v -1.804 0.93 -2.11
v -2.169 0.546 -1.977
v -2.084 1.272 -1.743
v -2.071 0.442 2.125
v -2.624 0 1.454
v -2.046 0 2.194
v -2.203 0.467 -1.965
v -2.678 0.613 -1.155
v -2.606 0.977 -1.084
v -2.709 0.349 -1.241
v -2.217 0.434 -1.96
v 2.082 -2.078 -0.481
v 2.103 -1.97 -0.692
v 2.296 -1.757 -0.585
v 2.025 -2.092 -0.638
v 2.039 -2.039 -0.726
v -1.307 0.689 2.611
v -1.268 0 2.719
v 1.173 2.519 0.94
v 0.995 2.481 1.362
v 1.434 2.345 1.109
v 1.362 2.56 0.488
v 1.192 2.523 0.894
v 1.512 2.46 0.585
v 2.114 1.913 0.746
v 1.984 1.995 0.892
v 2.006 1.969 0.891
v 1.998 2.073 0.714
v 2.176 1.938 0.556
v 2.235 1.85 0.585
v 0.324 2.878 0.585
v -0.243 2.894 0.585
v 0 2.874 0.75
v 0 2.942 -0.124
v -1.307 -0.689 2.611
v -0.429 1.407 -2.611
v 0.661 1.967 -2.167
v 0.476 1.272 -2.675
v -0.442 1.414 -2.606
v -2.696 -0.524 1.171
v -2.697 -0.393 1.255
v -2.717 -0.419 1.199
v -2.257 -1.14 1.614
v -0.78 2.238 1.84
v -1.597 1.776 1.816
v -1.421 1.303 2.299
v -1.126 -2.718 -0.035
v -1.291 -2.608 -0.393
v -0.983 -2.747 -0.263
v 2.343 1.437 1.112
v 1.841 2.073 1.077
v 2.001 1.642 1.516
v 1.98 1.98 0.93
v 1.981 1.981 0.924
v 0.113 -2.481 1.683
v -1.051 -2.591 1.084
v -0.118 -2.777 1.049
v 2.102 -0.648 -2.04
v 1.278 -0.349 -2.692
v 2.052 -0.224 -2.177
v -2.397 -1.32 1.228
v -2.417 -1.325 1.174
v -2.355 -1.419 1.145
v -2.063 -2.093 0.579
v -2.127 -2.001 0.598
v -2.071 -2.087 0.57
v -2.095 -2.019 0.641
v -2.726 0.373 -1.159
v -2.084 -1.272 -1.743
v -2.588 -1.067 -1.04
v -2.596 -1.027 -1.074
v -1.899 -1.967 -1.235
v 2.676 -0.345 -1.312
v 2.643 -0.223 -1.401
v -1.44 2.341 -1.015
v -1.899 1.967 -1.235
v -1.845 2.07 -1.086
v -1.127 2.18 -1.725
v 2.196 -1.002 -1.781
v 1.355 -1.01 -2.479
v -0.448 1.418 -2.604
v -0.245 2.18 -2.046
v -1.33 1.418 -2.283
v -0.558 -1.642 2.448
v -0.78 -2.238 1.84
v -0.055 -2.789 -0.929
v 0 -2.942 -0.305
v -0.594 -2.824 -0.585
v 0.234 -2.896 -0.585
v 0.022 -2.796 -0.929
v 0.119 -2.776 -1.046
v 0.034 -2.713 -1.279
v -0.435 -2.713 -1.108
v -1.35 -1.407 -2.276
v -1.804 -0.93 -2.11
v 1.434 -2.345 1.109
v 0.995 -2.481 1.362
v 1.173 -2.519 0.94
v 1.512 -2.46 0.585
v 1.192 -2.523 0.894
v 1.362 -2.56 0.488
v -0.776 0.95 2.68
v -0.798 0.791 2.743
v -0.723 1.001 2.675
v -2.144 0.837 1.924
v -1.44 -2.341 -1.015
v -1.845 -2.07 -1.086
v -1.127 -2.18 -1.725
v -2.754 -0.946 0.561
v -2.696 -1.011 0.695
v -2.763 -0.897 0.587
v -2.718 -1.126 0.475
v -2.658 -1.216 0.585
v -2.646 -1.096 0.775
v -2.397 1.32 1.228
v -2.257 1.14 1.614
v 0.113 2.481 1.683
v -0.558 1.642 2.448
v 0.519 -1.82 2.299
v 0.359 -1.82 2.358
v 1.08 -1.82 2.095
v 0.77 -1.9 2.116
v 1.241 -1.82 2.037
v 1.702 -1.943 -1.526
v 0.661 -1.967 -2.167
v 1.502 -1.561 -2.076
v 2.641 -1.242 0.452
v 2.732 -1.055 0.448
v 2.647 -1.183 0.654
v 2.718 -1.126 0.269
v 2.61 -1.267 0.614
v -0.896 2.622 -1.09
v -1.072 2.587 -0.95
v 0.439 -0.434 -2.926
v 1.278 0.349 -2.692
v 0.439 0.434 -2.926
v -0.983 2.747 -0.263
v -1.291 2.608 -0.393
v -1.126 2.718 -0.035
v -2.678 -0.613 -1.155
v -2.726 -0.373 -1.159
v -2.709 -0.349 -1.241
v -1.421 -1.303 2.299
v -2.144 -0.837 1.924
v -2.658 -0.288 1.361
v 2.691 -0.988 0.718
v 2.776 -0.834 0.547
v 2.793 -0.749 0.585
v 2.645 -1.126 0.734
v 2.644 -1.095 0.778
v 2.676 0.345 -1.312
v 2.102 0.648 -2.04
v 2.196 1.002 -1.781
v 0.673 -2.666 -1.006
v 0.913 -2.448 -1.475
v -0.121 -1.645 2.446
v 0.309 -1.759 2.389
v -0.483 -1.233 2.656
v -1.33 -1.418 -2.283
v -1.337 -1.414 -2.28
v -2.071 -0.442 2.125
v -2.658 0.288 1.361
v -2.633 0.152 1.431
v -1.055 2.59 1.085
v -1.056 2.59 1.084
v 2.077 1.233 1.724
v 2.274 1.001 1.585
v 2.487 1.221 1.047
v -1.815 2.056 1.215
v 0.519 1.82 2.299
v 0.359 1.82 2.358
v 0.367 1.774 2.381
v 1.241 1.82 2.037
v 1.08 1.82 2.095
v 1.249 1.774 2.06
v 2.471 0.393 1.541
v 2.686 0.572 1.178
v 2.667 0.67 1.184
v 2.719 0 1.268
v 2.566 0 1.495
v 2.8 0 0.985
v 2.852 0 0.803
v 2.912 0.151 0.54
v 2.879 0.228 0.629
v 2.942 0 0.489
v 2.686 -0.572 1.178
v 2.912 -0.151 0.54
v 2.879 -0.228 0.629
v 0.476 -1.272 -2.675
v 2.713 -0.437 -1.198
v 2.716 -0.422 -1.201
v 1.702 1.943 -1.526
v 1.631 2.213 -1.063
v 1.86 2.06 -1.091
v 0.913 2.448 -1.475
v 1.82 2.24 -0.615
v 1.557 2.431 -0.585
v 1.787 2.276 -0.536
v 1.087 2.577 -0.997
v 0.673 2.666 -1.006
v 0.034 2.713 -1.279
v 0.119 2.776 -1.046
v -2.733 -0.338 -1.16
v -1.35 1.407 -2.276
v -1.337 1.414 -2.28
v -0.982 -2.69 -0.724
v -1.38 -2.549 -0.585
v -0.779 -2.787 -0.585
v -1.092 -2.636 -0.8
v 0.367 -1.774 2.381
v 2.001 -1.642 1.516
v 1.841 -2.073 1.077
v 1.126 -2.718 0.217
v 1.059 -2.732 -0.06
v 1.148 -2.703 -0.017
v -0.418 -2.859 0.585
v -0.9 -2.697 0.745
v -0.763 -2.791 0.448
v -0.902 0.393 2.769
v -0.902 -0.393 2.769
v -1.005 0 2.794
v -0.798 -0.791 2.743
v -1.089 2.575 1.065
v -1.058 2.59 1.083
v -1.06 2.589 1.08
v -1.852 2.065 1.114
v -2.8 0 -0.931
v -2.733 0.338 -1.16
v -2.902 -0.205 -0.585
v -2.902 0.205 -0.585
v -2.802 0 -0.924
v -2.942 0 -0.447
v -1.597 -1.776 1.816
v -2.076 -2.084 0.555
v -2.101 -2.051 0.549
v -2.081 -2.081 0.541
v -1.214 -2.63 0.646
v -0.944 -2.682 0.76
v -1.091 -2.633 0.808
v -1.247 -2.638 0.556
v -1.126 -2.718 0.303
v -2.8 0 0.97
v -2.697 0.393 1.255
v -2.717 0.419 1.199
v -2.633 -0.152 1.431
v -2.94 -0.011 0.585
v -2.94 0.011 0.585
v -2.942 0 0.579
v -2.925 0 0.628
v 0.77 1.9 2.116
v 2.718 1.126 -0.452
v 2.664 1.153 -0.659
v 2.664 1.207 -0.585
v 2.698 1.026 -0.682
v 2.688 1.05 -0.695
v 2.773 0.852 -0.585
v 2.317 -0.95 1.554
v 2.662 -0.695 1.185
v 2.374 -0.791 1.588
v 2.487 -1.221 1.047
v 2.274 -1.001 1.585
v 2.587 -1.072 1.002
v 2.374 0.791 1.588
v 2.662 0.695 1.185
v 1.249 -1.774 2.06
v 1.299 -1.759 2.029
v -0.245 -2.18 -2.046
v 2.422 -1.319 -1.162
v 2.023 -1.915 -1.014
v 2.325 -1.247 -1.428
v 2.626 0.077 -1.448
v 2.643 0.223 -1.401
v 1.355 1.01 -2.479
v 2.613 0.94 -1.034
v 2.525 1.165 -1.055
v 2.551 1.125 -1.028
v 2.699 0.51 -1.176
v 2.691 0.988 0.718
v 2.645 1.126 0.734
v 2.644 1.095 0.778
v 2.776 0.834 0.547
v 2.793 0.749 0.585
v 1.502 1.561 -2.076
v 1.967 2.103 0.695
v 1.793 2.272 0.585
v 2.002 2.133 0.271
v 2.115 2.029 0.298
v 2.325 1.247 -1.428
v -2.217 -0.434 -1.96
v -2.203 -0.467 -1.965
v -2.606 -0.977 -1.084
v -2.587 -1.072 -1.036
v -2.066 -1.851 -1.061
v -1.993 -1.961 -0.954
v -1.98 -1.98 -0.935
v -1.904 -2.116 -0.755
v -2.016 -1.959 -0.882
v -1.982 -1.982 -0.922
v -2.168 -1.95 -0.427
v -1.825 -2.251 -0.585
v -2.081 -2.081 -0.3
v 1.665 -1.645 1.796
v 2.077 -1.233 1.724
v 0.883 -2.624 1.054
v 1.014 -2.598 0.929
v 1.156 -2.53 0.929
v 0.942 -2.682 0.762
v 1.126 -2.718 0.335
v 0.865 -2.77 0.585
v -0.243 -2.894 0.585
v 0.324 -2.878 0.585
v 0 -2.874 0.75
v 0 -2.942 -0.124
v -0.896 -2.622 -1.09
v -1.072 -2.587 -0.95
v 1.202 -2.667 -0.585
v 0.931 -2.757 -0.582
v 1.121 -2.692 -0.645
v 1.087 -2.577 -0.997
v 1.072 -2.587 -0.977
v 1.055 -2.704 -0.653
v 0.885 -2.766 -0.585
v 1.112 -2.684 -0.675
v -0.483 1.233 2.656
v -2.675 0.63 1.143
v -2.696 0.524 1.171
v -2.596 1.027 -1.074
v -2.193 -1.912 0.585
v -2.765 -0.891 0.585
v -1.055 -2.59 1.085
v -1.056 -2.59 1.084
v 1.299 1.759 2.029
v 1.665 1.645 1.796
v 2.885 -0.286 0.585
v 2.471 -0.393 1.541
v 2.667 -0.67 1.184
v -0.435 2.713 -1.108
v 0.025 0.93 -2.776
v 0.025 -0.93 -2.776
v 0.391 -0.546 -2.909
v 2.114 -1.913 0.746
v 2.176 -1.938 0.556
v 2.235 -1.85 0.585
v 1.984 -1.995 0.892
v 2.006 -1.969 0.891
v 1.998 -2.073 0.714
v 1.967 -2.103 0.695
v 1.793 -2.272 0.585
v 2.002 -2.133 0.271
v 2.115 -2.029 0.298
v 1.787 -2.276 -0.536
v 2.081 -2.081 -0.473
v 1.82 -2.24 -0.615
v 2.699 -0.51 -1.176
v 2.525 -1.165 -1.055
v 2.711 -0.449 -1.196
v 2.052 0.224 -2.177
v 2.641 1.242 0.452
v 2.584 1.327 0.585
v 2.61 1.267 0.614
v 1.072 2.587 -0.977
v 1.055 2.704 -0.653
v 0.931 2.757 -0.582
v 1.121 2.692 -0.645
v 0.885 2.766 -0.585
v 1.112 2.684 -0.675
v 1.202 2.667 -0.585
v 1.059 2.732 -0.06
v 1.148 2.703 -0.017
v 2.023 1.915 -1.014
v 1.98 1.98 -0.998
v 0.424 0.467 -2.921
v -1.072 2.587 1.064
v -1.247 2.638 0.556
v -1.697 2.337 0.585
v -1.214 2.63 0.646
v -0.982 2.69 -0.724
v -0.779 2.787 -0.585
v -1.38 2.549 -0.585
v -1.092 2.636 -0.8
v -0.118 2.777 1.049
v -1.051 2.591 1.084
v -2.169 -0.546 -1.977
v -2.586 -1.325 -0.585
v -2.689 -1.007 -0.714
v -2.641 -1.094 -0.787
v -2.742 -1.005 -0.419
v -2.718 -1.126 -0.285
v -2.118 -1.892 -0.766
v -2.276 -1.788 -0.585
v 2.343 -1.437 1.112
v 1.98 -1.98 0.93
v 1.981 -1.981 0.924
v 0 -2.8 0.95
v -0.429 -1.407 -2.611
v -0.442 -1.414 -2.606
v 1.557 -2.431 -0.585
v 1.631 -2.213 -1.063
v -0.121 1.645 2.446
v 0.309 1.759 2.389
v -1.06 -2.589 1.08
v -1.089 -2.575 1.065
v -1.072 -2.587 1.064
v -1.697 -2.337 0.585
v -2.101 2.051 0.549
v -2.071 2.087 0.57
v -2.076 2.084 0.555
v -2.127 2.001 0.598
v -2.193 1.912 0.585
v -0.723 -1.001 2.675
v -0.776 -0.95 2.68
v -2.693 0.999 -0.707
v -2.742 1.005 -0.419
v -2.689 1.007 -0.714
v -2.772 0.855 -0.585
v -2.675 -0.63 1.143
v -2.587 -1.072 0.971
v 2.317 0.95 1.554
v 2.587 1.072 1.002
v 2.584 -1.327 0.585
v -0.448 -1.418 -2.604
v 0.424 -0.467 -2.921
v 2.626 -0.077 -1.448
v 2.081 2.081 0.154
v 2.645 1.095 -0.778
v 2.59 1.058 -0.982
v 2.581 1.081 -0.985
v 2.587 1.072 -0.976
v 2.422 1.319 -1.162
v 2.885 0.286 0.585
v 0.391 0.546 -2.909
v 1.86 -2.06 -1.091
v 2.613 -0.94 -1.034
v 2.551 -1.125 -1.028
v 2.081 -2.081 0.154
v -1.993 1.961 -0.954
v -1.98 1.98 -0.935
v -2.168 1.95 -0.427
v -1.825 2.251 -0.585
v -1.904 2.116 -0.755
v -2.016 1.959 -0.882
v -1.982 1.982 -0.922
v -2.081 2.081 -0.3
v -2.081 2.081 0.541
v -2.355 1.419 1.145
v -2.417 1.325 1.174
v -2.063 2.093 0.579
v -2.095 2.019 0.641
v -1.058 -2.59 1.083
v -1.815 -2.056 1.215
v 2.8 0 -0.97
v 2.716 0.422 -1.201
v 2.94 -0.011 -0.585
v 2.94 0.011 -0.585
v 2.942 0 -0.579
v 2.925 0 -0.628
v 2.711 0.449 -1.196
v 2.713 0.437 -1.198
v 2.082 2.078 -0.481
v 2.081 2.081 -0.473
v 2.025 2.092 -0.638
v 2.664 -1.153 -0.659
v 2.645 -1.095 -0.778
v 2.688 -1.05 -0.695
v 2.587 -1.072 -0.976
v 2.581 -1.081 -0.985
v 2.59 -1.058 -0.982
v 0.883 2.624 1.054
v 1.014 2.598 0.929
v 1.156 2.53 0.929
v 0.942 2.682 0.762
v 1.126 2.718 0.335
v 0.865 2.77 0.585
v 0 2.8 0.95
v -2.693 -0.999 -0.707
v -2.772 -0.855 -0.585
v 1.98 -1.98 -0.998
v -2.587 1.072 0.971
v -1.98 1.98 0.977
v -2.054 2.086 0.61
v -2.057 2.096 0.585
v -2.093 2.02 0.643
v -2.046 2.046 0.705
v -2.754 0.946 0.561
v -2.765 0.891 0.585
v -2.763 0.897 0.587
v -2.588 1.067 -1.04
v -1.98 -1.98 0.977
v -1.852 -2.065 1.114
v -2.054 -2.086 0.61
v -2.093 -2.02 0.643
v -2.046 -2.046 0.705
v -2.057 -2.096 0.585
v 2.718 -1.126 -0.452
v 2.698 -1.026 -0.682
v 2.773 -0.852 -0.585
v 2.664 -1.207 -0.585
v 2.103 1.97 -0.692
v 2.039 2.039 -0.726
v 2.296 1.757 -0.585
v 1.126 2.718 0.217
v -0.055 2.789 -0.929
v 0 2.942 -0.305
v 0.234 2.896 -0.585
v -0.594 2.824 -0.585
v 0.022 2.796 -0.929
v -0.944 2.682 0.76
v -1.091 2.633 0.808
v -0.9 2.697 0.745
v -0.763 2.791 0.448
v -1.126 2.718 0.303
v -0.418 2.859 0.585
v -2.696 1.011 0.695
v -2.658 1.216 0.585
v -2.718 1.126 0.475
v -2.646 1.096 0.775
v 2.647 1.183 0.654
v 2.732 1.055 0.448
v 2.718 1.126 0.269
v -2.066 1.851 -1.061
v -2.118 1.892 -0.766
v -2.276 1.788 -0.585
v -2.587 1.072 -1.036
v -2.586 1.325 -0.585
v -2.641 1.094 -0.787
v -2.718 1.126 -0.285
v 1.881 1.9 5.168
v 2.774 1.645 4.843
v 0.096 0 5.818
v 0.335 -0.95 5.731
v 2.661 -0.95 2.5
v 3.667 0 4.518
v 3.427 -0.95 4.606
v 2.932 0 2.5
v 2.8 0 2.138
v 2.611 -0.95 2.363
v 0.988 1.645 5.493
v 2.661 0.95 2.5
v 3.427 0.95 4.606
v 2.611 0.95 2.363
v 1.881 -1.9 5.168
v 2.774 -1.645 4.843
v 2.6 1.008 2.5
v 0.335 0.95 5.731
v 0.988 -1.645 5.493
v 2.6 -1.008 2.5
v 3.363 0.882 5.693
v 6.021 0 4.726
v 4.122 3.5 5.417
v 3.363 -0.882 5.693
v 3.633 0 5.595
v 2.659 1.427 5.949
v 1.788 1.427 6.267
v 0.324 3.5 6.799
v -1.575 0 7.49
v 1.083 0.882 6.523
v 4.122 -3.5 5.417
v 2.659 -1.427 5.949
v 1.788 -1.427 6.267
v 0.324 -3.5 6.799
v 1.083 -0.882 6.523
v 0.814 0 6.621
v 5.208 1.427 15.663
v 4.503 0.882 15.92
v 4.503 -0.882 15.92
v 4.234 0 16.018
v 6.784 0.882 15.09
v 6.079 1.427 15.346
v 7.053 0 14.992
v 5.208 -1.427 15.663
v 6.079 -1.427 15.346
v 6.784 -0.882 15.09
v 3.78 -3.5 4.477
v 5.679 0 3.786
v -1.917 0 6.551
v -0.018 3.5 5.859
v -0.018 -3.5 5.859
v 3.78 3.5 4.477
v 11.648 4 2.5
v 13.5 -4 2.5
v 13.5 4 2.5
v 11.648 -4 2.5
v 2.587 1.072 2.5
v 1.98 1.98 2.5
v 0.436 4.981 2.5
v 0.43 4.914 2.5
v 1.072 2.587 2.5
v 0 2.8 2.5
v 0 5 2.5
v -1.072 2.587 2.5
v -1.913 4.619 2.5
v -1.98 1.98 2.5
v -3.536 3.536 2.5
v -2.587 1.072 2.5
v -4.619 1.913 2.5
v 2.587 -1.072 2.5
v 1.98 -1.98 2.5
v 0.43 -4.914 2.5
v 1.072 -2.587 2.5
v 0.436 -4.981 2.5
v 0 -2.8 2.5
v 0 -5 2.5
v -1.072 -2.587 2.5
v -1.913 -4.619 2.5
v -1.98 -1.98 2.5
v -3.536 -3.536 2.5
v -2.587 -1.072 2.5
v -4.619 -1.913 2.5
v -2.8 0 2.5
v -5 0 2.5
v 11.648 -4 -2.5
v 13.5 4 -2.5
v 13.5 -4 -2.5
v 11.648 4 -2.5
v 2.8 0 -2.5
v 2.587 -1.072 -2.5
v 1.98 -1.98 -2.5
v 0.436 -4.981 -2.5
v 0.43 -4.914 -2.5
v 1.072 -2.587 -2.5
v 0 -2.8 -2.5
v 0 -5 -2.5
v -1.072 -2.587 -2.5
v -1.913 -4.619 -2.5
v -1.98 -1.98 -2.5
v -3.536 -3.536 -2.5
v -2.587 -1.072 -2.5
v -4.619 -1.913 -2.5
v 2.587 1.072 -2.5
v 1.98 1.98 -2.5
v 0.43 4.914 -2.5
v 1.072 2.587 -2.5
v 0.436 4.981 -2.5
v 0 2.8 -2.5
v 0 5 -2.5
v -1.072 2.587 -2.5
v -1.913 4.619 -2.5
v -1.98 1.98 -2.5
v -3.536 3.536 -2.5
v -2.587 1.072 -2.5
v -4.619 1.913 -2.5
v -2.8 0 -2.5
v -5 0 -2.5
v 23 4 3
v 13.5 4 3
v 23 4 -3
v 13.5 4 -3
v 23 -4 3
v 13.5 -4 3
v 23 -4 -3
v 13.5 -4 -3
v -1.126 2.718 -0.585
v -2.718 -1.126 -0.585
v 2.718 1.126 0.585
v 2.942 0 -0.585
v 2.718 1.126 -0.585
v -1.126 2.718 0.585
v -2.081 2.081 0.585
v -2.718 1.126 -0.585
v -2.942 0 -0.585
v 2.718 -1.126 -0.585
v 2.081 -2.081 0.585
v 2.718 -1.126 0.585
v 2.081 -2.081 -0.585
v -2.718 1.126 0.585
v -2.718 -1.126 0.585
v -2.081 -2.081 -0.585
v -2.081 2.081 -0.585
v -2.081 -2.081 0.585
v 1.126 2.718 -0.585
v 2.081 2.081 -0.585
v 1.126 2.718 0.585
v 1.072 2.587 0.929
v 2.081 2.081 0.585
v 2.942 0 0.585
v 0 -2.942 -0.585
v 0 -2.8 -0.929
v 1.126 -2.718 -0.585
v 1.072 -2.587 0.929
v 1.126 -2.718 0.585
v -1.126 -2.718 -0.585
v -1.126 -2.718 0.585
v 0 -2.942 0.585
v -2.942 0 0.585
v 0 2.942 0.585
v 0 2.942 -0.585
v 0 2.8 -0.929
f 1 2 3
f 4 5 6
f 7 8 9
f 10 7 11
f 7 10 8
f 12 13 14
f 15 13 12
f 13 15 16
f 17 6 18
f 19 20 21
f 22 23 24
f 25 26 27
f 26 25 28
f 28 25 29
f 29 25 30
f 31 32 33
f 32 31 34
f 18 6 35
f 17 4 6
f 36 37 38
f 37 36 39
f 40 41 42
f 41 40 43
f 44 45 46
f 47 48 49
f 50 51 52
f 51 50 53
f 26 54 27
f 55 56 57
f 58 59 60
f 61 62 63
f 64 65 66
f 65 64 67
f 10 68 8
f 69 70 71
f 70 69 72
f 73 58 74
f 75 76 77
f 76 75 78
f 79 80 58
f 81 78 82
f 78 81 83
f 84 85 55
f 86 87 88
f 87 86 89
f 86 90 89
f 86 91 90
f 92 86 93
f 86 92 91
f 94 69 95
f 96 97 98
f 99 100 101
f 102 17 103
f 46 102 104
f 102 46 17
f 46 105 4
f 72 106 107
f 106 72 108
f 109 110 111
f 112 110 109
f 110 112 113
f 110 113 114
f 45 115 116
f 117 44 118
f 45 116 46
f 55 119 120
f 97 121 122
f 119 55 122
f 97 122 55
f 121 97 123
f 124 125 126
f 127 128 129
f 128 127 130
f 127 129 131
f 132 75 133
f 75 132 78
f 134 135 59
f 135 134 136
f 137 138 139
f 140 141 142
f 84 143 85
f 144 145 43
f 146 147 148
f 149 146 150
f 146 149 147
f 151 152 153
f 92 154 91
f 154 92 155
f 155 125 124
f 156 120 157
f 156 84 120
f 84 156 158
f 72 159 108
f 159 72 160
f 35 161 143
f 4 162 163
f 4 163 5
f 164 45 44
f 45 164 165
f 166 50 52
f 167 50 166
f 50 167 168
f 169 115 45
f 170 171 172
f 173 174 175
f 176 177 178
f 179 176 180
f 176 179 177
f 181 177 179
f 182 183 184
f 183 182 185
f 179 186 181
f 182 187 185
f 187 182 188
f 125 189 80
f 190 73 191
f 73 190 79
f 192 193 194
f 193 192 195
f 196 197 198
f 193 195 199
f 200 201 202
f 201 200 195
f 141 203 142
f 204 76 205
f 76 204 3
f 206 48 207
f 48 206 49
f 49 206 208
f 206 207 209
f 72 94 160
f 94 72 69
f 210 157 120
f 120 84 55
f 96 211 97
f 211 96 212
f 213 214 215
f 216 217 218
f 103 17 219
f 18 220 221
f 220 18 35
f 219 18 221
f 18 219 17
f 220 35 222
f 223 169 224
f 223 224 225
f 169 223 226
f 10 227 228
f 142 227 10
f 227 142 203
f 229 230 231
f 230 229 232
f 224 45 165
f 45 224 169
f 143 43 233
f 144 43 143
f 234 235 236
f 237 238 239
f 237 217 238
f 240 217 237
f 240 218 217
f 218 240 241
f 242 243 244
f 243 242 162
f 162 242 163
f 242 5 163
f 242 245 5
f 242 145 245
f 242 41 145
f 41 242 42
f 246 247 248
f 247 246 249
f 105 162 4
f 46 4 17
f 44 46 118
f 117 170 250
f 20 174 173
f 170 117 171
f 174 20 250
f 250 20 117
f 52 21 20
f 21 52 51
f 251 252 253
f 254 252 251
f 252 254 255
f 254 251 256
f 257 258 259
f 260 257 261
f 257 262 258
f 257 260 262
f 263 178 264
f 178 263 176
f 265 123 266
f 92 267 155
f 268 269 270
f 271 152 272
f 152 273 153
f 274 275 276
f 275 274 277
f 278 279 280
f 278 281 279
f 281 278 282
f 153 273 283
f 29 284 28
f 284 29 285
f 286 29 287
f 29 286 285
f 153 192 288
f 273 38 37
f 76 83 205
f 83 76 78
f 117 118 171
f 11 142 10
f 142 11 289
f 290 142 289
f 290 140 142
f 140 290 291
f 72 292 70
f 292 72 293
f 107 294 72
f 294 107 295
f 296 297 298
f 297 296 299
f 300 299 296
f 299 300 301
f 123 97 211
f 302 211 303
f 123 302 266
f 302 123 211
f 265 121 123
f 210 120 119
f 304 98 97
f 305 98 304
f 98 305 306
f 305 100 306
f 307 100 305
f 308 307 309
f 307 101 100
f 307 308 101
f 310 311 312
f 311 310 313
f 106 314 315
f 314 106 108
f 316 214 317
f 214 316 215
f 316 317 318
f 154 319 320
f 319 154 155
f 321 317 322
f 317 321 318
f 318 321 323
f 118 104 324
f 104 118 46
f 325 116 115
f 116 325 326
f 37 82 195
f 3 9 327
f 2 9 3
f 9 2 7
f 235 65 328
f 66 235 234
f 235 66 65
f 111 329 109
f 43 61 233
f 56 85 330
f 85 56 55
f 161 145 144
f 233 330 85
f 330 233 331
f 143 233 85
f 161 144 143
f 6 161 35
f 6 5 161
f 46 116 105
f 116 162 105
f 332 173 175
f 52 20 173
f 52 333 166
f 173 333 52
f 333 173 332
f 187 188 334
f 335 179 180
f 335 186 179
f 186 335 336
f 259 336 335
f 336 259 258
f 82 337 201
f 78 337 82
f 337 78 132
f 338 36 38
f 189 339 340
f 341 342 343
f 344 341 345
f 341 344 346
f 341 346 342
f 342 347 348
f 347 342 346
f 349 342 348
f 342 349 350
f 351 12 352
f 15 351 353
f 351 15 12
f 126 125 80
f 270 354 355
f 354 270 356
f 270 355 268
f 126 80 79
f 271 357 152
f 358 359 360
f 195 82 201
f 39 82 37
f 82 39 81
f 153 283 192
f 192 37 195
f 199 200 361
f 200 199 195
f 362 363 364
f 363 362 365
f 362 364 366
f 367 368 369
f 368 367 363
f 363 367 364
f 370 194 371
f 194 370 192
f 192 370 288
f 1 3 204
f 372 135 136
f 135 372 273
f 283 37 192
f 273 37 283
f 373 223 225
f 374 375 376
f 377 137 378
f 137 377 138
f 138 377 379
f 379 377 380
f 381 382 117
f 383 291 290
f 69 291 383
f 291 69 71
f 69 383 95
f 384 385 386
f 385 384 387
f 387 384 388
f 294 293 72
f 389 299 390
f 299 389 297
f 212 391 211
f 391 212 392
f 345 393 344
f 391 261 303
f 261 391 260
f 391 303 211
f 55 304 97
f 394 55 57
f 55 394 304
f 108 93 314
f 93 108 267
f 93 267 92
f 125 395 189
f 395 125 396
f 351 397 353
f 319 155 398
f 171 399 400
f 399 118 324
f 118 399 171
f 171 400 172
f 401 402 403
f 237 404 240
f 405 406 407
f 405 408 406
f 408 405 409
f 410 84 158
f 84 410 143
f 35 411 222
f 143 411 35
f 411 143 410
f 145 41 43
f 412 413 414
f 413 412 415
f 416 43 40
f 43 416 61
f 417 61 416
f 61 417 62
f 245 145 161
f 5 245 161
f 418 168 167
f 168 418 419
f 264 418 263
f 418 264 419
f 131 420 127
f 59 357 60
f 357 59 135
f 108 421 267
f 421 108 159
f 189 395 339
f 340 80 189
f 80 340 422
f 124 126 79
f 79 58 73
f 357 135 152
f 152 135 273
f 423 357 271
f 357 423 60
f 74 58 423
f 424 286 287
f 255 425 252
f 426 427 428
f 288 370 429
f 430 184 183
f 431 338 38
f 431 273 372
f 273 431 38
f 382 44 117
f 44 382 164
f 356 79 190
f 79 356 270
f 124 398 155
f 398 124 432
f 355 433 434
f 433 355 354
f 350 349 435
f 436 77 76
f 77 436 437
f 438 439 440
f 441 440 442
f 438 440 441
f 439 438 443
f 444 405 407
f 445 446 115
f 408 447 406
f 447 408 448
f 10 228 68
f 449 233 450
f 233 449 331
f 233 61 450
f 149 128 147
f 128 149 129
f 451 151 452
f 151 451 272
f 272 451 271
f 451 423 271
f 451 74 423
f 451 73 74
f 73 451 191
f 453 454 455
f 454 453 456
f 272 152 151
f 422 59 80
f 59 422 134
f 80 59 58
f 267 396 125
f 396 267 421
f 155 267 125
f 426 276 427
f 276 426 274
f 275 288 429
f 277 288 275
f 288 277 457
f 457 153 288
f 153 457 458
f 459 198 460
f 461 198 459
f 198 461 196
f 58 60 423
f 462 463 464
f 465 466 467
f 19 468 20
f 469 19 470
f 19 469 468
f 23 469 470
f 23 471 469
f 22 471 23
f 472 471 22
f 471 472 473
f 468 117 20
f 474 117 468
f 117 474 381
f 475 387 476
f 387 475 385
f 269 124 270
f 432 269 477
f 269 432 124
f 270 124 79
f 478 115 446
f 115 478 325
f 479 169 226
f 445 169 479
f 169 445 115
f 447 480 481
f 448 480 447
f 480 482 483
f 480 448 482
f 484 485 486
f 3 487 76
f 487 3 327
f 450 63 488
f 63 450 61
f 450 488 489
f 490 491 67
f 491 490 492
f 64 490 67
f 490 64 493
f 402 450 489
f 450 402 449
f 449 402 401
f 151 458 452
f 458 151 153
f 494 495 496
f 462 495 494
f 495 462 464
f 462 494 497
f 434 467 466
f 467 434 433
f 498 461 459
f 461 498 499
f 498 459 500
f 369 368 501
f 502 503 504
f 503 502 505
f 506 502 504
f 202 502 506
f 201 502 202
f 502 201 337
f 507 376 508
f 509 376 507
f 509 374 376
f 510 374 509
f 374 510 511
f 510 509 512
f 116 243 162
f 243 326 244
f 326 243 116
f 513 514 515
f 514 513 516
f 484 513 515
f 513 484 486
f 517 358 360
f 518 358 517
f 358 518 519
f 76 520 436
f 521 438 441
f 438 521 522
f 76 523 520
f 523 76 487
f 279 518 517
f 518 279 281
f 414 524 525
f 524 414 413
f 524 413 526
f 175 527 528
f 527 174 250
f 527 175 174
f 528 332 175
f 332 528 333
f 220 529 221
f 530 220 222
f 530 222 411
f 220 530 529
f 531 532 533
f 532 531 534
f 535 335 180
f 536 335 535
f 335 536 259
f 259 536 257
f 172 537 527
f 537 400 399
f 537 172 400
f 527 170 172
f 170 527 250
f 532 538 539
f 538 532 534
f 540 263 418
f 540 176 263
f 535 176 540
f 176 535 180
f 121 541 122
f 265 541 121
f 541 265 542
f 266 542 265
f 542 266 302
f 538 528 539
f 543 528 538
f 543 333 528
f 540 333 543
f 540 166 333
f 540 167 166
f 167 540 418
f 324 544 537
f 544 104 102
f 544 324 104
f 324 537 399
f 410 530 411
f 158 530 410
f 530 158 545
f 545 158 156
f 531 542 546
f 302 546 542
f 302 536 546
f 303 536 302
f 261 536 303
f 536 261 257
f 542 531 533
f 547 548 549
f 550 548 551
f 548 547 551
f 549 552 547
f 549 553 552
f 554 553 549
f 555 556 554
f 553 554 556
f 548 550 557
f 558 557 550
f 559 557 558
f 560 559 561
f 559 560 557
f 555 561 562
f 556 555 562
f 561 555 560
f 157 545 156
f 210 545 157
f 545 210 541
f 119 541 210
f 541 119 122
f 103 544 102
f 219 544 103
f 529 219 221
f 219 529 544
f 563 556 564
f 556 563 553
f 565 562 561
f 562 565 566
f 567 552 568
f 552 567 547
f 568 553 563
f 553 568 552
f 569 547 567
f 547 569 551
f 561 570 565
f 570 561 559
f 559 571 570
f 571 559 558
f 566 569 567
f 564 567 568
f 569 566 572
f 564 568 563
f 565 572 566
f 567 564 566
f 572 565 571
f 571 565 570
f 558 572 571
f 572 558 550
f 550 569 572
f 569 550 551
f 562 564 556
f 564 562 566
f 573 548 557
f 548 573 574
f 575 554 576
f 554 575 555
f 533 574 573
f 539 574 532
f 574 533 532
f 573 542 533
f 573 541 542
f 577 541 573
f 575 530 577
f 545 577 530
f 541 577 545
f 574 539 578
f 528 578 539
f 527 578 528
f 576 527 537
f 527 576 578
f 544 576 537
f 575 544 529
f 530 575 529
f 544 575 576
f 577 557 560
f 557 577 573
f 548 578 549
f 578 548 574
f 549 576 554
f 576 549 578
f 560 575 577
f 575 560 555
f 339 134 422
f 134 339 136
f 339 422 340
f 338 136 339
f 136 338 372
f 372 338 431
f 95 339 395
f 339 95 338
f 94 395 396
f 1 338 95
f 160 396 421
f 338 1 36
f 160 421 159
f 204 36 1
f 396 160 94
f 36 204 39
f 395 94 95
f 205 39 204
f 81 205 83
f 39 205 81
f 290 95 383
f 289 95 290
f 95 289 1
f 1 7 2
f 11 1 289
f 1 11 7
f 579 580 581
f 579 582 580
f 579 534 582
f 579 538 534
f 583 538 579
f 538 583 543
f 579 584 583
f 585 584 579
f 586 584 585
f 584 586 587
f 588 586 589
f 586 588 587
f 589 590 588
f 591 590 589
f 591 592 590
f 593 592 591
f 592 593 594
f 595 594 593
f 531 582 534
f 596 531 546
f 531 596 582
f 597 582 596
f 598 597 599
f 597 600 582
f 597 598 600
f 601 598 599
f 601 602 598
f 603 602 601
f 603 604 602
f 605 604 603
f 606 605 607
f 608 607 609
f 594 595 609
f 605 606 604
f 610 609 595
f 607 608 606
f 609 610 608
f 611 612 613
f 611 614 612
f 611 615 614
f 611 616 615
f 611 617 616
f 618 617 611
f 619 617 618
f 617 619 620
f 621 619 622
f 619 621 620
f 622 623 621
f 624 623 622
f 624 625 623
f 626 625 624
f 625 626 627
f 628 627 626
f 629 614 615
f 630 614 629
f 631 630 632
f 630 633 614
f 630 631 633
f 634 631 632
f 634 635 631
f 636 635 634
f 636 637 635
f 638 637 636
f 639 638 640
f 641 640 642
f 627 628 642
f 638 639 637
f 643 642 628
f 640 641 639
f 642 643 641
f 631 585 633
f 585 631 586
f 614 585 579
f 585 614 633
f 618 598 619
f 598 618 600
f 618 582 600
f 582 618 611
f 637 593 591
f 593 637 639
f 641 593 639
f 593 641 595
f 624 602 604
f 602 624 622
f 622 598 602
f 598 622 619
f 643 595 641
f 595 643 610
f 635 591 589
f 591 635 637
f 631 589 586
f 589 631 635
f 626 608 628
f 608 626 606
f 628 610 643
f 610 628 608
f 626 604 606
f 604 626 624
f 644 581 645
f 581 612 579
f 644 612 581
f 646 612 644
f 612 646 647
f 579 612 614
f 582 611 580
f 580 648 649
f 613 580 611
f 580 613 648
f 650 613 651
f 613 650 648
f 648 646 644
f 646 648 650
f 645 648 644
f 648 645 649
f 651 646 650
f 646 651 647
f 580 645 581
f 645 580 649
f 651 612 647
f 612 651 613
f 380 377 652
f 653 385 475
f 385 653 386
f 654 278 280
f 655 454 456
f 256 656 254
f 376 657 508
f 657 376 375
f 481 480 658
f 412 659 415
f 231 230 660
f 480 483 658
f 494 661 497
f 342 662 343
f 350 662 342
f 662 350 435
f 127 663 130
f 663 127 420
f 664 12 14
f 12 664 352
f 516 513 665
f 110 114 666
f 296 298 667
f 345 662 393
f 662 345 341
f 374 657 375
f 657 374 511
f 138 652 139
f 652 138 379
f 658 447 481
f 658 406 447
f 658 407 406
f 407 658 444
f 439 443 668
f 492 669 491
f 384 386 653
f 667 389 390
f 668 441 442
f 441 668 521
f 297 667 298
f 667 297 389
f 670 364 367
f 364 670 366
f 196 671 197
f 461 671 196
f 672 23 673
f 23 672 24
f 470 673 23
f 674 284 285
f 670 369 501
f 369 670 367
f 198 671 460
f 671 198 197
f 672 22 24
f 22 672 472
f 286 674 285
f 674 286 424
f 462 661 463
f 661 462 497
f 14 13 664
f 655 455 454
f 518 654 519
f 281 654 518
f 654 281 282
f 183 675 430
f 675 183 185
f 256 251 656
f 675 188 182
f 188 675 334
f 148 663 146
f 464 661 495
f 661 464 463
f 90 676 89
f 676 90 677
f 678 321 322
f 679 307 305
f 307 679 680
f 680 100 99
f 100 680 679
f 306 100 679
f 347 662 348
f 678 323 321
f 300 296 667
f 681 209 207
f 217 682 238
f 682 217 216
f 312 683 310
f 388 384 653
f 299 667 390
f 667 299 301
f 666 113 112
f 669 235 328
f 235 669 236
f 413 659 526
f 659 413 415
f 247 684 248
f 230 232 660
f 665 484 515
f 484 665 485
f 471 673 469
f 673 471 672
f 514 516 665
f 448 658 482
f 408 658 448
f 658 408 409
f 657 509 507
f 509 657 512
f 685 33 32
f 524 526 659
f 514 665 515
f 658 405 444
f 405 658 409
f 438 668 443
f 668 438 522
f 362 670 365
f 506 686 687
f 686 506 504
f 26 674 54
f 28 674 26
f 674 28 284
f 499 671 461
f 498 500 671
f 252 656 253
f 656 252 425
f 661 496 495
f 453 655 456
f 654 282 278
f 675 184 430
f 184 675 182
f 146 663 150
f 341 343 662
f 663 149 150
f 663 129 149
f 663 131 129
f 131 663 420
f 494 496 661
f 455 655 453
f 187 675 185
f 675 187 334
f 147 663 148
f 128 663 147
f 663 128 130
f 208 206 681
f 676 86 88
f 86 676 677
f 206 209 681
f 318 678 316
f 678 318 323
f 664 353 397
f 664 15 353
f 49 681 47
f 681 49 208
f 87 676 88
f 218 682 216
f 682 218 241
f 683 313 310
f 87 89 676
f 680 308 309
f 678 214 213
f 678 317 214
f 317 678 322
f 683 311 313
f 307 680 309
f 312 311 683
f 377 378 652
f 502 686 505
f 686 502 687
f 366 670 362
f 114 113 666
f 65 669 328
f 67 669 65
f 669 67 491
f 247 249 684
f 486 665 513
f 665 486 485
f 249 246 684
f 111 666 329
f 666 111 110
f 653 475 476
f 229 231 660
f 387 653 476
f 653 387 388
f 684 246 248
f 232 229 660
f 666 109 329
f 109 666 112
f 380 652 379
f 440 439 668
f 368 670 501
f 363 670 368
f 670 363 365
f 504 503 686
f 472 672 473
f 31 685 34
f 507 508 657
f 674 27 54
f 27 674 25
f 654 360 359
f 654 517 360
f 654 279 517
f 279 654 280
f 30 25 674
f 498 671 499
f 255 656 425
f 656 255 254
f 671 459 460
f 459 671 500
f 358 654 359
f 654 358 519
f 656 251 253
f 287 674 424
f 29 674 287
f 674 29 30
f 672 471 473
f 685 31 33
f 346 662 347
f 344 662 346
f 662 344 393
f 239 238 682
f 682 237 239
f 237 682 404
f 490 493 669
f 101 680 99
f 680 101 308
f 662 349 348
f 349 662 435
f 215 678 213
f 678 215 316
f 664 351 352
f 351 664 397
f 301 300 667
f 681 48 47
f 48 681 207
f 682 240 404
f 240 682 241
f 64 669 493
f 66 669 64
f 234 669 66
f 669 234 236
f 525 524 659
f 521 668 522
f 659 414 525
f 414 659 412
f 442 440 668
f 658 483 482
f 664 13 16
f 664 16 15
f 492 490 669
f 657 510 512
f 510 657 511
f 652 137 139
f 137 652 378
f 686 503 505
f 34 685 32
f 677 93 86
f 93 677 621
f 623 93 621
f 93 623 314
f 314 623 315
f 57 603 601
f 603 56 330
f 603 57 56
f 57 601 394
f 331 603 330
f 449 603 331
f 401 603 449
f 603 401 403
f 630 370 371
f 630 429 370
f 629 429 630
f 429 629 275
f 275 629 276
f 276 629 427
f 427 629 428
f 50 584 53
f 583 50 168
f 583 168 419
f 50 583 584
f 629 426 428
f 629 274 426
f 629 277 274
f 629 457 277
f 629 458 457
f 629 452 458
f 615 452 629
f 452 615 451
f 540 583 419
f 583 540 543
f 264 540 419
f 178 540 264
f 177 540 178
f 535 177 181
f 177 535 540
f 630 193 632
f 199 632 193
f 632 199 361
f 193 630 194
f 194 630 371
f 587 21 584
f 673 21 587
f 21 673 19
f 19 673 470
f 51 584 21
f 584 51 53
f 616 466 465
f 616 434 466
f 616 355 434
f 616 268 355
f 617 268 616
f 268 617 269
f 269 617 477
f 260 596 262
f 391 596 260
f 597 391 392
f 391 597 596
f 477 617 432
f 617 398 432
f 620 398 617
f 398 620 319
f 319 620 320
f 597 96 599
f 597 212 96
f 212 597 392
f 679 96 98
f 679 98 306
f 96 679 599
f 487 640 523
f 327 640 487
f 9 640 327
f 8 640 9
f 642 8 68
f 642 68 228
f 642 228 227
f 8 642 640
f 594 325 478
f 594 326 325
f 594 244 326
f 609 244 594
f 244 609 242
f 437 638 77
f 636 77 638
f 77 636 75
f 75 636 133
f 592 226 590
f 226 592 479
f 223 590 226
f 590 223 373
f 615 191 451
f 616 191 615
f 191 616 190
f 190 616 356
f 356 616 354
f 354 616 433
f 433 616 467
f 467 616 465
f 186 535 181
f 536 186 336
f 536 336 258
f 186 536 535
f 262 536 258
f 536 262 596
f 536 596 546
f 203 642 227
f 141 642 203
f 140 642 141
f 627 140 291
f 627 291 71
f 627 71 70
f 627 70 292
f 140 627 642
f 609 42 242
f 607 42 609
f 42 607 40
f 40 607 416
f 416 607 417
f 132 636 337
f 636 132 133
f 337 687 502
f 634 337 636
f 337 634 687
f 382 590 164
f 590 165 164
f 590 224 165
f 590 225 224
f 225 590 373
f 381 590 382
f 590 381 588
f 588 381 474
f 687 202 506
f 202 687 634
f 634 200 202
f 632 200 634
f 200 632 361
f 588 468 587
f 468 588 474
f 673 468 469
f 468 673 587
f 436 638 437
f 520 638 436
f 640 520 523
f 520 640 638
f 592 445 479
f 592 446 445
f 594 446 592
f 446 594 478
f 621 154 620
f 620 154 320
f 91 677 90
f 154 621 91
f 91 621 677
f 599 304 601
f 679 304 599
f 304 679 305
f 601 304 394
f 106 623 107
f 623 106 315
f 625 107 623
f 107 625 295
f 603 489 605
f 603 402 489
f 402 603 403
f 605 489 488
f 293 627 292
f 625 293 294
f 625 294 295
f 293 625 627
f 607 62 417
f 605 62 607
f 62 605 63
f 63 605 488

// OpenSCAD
// file: ../configuration.scad
$fa = 2;
$fs = 0.5;

motor_end_height=44;
idler_end_height=28;
carriage_height=13.8;
platform_thickness=10;
platform_fix_dia=28;
platform_dia=38;

bearing_diameter=16;
bearing_dia_clearence=0.5;
bearing_free_dia_clearence=0.8;

hotend_diameter=16.4;
hotend_groove_dia=12;

// Frames

// Places mounting holes for the controller
// 33 = RAMPS 1.3 (Power outputs: Extruder, Bed, Fan)
// 34 = RAMPS 1.3 (Power outputs: Extruder0, Extruder1, Bed)
// 35 = RAMPS 1.3 (Power outputs: Extruder, Fan, Fan)
// 70 = Megatronics
// 701 = Megatronics 2.0

motherboard=35;

frame_thickness=8;

// Distance from motor axle to idler axle
// Calculated regarding length of the HTD3M closed belt 
belt_tooth=354;
spacing = round(((belt_tooth*3) - 3.14159 * 24.83) / 2);

rod_length=spacing+55;
rod_diameter=8;
//platform_hinge_offset=25;
//carriage_hinge_offset=17;

printbed_diameter=170;	//printable aera
printbed_thickness=4;		// used for rendering and approximating build volume


//corner_radius=12;
//frame_radius=(tower_radius-rod_diameter/2-corner_radius)/cos(30);

ball_link_distance=40;//55;
ball_offset=6.5;
ball_distance=ball_link_distance-2*ball_offset;
ball_angle=25;

// Delta Settings

delta_smooth_rod_offset=139.5;//140 - 152 floor(printbed_diameter/(2*sin(ball_angle))-printbed_diameter/2+delta_effector_offset+delta_carriage_offset)
delta_effector_offset=18;
delta_carriage_offset=18;
delta_diagonal_rod=ceil(max(printbed_diameter/2+delta_smooth_rod_offset-delta_effector_offset-delta_carriage_offset,printbed_diameter/(2*sin(ball_angle))));
//|-> 202
delta_radius=(delta_smooth_rod_offset-delta_effector_offset-delta_carriage_offset);

diagonal_rod_length=delta_diagonal_rod-2*8;//165
diagonal_rod_diameter=3;
diagonal_rod_length_lost=(printbed_diameter/(2*sin(ball_angle)))-(printbed_diameter/2+delta_smooth_rod_offset-delta_effector_offset-delta_carriage_offset);

diagonal_rod_angle=acos(delta_radius/delta_diagonal_rod);

echo_result=true;

carriage_altitude=sqrt(pow(delta_diagonal_rod,2)-pow(delta_radius,2));



if(echo_result) {
	echo("printbed_diameter",printbed_diameter);
	echo("delta_diagonal_rod",delta_diagonal_rod);
	echo("diagonal_rod_length",diagonal_rod_length);
	echo("delta_effector_offset",delta_effector_offset);
	echo("delta_carriage_offset",delta_carriage_offset);
	echo("delta_radius",delta_radius);
	echo("diagonal_rod_angle",diagonal_rod_angle);
	echo("carriage_altitude",carriage_altitude);
	echo("diagonal_rod_length_lost",diagonal_rod_length_lost);
	echo("delta_smooth_rod_offset_optimum",printbed_diameter/(2*sin(ball_angle))-printbed_diameter/2+delta_effector_offset+delta_carriage_offset);
	echo("rod_length",rod_length);
}
// file: ball_link.scad
include <../configuration.scad>;

$fn=16;

ball_link();

module ball_link() {
	color("DarkSlateGray") difference() {
		union() {
			cylinder(h = 5, r = 5, center = true);
			translate([(23-9)/2,0,0]) cube([23-9,8,5],true);
			translate([23-(9.5)/2,0,0]) cube([9.5,8,6],true);
			for(m = [0,1]) mirror([ 0, m, 0 ]) rotate([0,0,-5]) translate([0,0,-2.5]) cube([12,5,5],false);
		}
		sphere(r=3,center = true);
		cylinder(h = 10, r = 2.8, center = true);
		//sphere(r= 4);
	}
}
// file: ball.scad
include <../configuration.scad>;

$fa=2;
$fs=1;

//Kavan Maxi Ball Link 1408

module ball(env) {
	color("grey") difference() {
		union() {
			translate([-ball_offset,0,0]) sphere(r=3,center = true);
			translate([-ball_offset/2,0,0]) rotate([0,90,0]) cylinder( h = ball_offset, r = 3.8/2, center = true);
			translate([5,0,0]) rotate([0,90,0]) cylinder( h = 10, r = 1.5, center = true);
			translate([-0.5,0,0]) rotate([0,90,0]) cylinder( h = 1, r = (7*2/sqrt(3))/2, center = true, $fn = 6);
		}
		translate([-9.6,0,0]) rotate([0,90,0]) cylinder( h = 1, r = 4, center = true, $fn = 6);
	}
	if (env) {
		color("black",0.5) translate([-6.5,0,0]) sphere(r=5,center = true);
	}
}

ball();
//ball(true);
// main file
use <ball.scad>
use <ball_link.scad>

rotate([0, 20, 0]) rotate([0, -90, 0]) translate([6.5, 0, 0]) ball();
ball_link();
